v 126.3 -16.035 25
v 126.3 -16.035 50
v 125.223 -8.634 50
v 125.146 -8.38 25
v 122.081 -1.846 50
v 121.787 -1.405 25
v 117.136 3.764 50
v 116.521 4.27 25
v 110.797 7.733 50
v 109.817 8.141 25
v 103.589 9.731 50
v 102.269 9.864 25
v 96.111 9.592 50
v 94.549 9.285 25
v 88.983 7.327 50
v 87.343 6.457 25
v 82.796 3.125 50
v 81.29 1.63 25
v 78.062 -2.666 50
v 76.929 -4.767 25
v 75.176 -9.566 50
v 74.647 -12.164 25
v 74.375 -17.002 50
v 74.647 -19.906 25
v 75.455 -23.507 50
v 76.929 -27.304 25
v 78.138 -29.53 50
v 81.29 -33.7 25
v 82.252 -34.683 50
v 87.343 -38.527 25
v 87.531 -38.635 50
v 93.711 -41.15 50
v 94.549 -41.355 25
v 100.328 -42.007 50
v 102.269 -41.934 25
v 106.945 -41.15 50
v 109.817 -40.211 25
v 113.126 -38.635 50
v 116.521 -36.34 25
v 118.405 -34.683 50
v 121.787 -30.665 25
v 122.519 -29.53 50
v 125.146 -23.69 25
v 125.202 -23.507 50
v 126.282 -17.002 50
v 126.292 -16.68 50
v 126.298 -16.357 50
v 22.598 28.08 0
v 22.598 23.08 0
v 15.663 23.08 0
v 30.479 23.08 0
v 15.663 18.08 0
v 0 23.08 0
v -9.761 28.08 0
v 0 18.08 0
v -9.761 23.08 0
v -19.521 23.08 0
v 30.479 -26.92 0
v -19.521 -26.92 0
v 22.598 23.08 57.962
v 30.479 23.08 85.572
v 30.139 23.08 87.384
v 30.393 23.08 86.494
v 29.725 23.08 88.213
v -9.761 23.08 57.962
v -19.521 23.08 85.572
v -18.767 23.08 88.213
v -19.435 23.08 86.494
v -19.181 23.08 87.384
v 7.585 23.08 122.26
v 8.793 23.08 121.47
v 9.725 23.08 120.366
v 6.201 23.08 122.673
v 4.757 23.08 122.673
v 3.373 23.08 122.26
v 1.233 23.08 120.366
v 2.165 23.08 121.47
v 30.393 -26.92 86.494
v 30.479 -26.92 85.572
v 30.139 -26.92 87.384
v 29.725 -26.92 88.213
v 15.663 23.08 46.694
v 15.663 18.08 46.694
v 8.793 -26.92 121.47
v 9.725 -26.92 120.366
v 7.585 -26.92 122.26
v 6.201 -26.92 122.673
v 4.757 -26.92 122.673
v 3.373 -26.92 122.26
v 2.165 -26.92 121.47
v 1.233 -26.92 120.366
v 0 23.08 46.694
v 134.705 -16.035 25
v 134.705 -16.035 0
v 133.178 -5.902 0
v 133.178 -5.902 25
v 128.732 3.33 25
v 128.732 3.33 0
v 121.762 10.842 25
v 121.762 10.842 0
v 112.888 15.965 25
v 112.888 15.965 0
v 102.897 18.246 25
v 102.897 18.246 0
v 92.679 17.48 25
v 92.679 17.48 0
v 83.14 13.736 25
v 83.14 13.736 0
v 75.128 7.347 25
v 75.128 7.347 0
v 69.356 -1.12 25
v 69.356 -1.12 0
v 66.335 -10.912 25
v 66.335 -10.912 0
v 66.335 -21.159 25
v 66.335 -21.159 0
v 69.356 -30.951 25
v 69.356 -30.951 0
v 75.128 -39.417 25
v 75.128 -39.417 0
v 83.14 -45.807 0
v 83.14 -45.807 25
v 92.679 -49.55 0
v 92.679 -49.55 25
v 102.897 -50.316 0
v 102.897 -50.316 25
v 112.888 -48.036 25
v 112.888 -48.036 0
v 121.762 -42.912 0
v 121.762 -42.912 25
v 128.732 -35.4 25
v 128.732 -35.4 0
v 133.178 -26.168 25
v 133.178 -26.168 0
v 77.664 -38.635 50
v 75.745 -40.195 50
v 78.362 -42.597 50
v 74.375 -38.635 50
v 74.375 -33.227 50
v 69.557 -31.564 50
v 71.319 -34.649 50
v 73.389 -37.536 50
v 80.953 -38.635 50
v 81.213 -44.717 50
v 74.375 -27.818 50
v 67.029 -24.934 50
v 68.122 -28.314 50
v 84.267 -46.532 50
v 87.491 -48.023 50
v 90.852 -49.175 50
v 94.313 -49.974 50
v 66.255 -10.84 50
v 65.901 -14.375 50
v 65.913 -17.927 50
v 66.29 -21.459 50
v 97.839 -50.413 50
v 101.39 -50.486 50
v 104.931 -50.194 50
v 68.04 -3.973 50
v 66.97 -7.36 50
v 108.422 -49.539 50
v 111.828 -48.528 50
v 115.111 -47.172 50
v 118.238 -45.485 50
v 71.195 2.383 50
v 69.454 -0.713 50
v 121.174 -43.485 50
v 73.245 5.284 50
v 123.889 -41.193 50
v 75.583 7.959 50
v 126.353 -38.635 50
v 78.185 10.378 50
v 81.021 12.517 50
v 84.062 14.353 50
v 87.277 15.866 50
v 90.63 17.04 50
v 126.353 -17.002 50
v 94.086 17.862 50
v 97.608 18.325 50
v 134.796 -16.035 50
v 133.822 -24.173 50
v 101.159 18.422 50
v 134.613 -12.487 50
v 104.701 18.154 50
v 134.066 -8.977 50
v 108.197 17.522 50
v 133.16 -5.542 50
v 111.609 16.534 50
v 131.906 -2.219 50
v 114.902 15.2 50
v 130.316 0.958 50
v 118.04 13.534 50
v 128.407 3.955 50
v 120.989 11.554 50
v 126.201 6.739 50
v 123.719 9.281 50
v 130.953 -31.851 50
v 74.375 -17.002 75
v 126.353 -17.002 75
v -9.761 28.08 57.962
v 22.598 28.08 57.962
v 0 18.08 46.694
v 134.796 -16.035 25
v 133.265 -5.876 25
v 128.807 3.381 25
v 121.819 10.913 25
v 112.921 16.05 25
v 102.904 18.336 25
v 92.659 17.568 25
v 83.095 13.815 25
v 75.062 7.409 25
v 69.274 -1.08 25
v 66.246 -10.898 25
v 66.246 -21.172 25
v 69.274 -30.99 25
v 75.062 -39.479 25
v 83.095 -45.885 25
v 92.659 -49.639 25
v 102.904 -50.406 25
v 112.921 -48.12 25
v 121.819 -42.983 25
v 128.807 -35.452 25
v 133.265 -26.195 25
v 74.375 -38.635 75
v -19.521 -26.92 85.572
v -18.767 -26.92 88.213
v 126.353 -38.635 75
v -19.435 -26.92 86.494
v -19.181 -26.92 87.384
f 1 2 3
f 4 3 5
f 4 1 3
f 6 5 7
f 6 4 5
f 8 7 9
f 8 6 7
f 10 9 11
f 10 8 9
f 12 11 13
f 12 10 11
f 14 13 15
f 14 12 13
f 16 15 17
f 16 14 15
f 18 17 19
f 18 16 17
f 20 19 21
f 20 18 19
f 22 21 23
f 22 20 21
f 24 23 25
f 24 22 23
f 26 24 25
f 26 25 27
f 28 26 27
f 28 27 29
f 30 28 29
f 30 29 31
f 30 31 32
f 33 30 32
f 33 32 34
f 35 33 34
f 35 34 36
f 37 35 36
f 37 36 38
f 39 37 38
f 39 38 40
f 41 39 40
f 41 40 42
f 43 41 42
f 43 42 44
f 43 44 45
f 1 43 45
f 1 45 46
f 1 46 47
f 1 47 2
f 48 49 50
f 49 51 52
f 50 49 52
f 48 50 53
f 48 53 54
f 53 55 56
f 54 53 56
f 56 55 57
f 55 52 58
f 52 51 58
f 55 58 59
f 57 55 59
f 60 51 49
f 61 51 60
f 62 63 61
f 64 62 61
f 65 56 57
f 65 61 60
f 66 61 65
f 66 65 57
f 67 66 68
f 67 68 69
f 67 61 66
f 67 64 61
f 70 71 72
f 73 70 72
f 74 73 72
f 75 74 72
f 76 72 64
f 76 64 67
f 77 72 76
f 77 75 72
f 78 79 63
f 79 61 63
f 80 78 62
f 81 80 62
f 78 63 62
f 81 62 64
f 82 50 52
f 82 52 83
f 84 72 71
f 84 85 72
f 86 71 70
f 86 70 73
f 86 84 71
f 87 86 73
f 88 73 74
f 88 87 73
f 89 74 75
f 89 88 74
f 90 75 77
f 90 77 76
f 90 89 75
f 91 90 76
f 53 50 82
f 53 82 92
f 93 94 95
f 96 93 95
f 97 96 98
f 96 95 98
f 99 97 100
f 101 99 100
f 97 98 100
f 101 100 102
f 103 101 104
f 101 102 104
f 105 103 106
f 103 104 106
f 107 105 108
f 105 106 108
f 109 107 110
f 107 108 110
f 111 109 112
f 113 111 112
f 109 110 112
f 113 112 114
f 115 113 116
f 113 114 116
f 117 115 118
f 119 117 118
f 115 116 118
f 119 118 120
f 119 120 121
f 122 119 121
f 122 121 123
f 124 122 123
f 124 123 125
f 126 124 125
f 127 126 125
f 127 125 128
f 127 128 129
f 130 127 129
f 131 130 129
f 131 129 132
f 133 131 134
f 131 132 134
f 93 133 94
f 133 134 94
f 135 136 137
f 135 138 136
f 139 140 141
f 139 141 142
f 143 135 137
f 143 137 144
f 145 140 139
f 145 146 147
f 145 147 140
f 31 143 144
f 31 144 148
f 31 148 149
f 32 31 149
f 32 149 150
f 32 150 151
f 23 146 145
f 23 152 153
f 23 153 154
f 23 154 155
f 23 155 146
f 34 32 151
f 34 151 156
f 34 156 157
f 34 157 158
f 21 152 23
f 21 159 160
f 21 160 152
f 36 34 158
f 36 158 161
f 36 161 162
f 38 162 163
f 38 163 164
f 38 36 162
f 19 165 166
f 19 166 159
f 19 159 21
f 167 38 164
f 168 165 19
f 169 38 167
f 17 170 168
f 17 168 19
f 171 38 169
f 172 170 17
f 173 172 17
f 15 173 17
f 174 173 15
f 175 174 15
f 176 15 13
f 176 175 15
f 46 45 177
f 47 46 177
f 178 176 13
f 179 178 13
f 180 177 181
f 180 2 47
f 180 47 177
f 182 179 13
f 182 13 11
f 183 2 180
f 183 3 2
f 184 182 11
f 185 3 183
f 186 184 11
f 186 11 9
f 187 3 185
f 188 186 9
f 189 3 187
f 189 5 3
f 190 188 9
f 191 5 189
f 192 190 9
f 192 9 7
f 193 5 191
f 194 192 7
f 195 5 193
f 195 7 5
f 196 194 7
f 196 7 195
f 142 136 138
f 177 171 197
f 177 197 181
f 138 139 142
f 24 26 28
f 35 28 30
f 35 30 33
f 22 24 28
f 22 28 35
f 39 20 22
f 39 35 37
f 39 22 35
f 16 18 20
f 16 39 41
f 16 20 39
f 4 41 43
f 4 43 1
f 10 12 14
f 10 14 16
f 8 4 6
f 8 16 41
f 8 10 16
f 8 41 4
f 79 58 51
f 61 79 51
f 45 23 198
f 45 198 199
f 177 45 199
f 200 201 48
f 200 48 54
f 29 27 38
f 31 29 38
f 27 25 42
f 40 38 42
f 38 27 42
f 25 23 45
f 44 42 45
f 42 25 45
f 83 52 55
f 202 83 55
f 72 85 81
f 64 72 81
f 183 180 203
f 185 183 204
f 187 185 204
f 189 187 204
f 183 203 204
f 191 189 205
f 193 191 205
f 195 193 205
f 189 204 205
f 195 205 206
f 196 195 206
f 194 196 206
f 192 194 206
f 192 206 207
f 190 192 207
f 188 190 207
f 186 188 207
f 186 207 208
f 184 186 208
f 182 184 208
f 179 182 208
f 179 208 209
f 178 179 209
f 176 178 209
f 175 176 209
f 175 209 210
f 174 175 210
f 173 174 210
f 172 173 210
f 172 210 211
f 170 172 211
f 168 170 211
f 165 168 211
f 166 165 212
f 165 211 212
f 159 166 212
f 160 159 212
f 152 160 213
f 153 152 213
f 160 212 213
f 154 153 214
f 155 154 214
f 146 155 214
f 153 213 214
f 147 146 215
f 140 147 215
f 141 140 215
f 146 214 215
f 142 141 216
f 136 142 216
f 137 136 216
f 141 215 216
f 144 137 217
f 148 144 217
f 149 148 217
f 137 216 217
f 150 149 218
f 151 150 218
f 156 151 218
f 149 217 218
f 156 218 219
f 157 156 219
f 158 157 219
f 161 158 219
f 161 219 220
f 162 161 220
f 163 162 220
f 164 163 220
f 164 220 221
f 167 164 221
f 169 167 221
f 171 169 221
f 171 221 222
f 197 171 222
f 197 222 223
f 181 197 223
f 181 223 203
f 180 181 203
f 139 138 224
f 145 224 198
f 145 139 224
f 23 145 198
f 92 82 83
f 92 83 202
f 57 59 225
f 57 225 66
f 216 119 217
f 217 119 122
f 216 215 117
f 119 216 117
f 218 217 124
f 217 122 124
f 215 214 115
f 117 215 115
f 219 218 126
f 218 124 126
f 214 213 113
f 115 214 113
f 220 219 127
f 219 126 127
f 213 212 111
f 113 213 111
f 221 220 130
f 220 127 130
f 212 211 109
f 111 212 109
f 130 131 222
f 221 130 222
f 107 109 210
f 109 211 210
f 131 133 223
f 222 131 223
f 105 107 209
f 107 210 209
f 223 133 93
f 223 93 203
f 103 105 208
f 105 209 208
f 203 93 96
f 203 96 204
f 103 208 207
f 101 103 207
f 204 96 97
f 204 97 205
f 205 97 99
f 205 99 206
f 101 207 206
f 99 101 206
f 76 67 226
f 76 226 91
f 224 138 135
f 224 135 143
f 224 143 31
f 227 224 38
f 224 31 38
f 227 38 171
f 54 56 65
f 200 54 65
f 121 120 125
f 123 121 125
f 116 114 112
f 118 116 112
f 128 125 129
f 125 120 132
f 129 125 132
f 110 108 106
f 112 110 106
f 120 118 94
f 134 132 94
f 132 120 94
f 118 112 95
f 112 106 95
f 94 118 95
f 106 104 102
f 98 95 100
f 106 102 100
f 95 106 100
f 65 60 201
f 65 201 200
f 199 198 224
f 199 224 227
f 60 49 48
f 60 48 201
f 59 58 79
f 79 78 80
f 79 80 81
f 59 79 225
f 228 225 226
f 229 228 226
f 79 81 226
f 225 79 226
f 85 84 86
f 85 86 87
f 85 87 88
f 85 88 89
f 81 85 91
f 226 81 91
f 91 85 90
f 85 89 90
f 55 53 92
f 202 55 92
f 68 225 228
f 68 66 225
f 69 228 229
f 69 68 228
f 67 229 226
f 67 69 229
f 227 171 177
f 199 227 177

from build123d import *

# Parameters (mm, degrees)
F0_W      = 50
F0_H      = 50
F1_DEPTH  = 87
F3_DEPTH  = 50
F4_W      = 15.663402155
F4_H      = 46.6940775514
F5_DEPTH  = 5
F6_W      = 32.3581049219
F6_H      = 57.9620562494
F7_DEPTH  = 5
F8_R      = 5
F9_R      = 34.3769329791
F10_DEPTH = 25
F11_R     = 34.467652718
F11_R_2   = 25.9714115072
F12_DEPTH = 25
F13_W     = 51.9779939204
F13_H     = 21.6330016287
F14_DEPTH = 25


with BuildPart() as f1:
    # F0 (on Top) → F1 (new body)
    with BuildSketch(Plane.XY):
        with Locations((5.478881672, -1.9204340875)):
            Rectangle(F0_W, F0_H)
    extrude(amount=F1_DEPTH)

    # F2 (on face) → F3 (join)
    with BuildSketch(Plane(origin=(0, 23.0795659125, 0), x_dir=(-1, 0, 0), z_dir=(0, 1, 0))):
        Polygon((-5.478881672, 127.1920949221), (-30.478881672, 87), (19.521118328, 87), align=None)
    extrude(amount=-F3_DEPTH)

    # F4 (on face) → F5 (cut)
    with BuildSketch(Plane(origin=(0, 23.0795659125, 0), x_dir=(-1, 0, 0), z_dir=(0, 1, 0))):
        with Locations((-7.8317010775, 23.3470387757)):
            Rectangle(F4_W, F4_H)
    extrude(amount=-F5_DEPTH, mode=Mode.SUBTRACT)

    # F6 (on face) → F7 (join)
    with BuildSketch(Plane(origin=(0, 23.0795659125, 0), x_dir=(-1, 0, 0), z_dir=(0, 1, 0))):
        with Locations((-6.418493297, 28.9810281247)):
            Rectangle(F6_W, F6_H)
    extrude(amount=F7_DEPTH)

    # F8
    f8_edges = [f1.edges().sort_by_distance(p)[0] for p in [
        (5.478882, -1.920434, 127.192095),
        (30.478882, -1.920434, 87),
        (-19.521118, -1.920434, 87),
    ]]
    fillet(f8_edges, radius=F8_R)


with BuildPart() as f10:
    # F9 (on Top) → F10 (new body)
    with BuildSketch(Plane.XY):
        with Locations((100.3283709288, -16.0352047533)):
            Circle(F9_R)
    extrude(amount=F10_DEPTH)

    # F11 (on face) → F12 (join)
    with BuildSketch(Plane.XY.offset(25)):
        with Locations((100.3283709288, -16.0352047533)):
            Circle(F11_R)
        with Locations((100.3283709288, -16.0352047533)):
            Circle(F11_R_2, mode=Mode.SUBTRACT)
    extrude(amount=F12_DEPTH)

    # F13 (on face) → F14 (join)
    with BuildSketch(Plane.XY.offset(50)):
        with Locations((100.3639488405, -27.8182744353)):
            Rectangle(F13_W, F13_H)
    extrude(amount=F14_DEPTH)


solid = Compound([f1.part, f10.part])
